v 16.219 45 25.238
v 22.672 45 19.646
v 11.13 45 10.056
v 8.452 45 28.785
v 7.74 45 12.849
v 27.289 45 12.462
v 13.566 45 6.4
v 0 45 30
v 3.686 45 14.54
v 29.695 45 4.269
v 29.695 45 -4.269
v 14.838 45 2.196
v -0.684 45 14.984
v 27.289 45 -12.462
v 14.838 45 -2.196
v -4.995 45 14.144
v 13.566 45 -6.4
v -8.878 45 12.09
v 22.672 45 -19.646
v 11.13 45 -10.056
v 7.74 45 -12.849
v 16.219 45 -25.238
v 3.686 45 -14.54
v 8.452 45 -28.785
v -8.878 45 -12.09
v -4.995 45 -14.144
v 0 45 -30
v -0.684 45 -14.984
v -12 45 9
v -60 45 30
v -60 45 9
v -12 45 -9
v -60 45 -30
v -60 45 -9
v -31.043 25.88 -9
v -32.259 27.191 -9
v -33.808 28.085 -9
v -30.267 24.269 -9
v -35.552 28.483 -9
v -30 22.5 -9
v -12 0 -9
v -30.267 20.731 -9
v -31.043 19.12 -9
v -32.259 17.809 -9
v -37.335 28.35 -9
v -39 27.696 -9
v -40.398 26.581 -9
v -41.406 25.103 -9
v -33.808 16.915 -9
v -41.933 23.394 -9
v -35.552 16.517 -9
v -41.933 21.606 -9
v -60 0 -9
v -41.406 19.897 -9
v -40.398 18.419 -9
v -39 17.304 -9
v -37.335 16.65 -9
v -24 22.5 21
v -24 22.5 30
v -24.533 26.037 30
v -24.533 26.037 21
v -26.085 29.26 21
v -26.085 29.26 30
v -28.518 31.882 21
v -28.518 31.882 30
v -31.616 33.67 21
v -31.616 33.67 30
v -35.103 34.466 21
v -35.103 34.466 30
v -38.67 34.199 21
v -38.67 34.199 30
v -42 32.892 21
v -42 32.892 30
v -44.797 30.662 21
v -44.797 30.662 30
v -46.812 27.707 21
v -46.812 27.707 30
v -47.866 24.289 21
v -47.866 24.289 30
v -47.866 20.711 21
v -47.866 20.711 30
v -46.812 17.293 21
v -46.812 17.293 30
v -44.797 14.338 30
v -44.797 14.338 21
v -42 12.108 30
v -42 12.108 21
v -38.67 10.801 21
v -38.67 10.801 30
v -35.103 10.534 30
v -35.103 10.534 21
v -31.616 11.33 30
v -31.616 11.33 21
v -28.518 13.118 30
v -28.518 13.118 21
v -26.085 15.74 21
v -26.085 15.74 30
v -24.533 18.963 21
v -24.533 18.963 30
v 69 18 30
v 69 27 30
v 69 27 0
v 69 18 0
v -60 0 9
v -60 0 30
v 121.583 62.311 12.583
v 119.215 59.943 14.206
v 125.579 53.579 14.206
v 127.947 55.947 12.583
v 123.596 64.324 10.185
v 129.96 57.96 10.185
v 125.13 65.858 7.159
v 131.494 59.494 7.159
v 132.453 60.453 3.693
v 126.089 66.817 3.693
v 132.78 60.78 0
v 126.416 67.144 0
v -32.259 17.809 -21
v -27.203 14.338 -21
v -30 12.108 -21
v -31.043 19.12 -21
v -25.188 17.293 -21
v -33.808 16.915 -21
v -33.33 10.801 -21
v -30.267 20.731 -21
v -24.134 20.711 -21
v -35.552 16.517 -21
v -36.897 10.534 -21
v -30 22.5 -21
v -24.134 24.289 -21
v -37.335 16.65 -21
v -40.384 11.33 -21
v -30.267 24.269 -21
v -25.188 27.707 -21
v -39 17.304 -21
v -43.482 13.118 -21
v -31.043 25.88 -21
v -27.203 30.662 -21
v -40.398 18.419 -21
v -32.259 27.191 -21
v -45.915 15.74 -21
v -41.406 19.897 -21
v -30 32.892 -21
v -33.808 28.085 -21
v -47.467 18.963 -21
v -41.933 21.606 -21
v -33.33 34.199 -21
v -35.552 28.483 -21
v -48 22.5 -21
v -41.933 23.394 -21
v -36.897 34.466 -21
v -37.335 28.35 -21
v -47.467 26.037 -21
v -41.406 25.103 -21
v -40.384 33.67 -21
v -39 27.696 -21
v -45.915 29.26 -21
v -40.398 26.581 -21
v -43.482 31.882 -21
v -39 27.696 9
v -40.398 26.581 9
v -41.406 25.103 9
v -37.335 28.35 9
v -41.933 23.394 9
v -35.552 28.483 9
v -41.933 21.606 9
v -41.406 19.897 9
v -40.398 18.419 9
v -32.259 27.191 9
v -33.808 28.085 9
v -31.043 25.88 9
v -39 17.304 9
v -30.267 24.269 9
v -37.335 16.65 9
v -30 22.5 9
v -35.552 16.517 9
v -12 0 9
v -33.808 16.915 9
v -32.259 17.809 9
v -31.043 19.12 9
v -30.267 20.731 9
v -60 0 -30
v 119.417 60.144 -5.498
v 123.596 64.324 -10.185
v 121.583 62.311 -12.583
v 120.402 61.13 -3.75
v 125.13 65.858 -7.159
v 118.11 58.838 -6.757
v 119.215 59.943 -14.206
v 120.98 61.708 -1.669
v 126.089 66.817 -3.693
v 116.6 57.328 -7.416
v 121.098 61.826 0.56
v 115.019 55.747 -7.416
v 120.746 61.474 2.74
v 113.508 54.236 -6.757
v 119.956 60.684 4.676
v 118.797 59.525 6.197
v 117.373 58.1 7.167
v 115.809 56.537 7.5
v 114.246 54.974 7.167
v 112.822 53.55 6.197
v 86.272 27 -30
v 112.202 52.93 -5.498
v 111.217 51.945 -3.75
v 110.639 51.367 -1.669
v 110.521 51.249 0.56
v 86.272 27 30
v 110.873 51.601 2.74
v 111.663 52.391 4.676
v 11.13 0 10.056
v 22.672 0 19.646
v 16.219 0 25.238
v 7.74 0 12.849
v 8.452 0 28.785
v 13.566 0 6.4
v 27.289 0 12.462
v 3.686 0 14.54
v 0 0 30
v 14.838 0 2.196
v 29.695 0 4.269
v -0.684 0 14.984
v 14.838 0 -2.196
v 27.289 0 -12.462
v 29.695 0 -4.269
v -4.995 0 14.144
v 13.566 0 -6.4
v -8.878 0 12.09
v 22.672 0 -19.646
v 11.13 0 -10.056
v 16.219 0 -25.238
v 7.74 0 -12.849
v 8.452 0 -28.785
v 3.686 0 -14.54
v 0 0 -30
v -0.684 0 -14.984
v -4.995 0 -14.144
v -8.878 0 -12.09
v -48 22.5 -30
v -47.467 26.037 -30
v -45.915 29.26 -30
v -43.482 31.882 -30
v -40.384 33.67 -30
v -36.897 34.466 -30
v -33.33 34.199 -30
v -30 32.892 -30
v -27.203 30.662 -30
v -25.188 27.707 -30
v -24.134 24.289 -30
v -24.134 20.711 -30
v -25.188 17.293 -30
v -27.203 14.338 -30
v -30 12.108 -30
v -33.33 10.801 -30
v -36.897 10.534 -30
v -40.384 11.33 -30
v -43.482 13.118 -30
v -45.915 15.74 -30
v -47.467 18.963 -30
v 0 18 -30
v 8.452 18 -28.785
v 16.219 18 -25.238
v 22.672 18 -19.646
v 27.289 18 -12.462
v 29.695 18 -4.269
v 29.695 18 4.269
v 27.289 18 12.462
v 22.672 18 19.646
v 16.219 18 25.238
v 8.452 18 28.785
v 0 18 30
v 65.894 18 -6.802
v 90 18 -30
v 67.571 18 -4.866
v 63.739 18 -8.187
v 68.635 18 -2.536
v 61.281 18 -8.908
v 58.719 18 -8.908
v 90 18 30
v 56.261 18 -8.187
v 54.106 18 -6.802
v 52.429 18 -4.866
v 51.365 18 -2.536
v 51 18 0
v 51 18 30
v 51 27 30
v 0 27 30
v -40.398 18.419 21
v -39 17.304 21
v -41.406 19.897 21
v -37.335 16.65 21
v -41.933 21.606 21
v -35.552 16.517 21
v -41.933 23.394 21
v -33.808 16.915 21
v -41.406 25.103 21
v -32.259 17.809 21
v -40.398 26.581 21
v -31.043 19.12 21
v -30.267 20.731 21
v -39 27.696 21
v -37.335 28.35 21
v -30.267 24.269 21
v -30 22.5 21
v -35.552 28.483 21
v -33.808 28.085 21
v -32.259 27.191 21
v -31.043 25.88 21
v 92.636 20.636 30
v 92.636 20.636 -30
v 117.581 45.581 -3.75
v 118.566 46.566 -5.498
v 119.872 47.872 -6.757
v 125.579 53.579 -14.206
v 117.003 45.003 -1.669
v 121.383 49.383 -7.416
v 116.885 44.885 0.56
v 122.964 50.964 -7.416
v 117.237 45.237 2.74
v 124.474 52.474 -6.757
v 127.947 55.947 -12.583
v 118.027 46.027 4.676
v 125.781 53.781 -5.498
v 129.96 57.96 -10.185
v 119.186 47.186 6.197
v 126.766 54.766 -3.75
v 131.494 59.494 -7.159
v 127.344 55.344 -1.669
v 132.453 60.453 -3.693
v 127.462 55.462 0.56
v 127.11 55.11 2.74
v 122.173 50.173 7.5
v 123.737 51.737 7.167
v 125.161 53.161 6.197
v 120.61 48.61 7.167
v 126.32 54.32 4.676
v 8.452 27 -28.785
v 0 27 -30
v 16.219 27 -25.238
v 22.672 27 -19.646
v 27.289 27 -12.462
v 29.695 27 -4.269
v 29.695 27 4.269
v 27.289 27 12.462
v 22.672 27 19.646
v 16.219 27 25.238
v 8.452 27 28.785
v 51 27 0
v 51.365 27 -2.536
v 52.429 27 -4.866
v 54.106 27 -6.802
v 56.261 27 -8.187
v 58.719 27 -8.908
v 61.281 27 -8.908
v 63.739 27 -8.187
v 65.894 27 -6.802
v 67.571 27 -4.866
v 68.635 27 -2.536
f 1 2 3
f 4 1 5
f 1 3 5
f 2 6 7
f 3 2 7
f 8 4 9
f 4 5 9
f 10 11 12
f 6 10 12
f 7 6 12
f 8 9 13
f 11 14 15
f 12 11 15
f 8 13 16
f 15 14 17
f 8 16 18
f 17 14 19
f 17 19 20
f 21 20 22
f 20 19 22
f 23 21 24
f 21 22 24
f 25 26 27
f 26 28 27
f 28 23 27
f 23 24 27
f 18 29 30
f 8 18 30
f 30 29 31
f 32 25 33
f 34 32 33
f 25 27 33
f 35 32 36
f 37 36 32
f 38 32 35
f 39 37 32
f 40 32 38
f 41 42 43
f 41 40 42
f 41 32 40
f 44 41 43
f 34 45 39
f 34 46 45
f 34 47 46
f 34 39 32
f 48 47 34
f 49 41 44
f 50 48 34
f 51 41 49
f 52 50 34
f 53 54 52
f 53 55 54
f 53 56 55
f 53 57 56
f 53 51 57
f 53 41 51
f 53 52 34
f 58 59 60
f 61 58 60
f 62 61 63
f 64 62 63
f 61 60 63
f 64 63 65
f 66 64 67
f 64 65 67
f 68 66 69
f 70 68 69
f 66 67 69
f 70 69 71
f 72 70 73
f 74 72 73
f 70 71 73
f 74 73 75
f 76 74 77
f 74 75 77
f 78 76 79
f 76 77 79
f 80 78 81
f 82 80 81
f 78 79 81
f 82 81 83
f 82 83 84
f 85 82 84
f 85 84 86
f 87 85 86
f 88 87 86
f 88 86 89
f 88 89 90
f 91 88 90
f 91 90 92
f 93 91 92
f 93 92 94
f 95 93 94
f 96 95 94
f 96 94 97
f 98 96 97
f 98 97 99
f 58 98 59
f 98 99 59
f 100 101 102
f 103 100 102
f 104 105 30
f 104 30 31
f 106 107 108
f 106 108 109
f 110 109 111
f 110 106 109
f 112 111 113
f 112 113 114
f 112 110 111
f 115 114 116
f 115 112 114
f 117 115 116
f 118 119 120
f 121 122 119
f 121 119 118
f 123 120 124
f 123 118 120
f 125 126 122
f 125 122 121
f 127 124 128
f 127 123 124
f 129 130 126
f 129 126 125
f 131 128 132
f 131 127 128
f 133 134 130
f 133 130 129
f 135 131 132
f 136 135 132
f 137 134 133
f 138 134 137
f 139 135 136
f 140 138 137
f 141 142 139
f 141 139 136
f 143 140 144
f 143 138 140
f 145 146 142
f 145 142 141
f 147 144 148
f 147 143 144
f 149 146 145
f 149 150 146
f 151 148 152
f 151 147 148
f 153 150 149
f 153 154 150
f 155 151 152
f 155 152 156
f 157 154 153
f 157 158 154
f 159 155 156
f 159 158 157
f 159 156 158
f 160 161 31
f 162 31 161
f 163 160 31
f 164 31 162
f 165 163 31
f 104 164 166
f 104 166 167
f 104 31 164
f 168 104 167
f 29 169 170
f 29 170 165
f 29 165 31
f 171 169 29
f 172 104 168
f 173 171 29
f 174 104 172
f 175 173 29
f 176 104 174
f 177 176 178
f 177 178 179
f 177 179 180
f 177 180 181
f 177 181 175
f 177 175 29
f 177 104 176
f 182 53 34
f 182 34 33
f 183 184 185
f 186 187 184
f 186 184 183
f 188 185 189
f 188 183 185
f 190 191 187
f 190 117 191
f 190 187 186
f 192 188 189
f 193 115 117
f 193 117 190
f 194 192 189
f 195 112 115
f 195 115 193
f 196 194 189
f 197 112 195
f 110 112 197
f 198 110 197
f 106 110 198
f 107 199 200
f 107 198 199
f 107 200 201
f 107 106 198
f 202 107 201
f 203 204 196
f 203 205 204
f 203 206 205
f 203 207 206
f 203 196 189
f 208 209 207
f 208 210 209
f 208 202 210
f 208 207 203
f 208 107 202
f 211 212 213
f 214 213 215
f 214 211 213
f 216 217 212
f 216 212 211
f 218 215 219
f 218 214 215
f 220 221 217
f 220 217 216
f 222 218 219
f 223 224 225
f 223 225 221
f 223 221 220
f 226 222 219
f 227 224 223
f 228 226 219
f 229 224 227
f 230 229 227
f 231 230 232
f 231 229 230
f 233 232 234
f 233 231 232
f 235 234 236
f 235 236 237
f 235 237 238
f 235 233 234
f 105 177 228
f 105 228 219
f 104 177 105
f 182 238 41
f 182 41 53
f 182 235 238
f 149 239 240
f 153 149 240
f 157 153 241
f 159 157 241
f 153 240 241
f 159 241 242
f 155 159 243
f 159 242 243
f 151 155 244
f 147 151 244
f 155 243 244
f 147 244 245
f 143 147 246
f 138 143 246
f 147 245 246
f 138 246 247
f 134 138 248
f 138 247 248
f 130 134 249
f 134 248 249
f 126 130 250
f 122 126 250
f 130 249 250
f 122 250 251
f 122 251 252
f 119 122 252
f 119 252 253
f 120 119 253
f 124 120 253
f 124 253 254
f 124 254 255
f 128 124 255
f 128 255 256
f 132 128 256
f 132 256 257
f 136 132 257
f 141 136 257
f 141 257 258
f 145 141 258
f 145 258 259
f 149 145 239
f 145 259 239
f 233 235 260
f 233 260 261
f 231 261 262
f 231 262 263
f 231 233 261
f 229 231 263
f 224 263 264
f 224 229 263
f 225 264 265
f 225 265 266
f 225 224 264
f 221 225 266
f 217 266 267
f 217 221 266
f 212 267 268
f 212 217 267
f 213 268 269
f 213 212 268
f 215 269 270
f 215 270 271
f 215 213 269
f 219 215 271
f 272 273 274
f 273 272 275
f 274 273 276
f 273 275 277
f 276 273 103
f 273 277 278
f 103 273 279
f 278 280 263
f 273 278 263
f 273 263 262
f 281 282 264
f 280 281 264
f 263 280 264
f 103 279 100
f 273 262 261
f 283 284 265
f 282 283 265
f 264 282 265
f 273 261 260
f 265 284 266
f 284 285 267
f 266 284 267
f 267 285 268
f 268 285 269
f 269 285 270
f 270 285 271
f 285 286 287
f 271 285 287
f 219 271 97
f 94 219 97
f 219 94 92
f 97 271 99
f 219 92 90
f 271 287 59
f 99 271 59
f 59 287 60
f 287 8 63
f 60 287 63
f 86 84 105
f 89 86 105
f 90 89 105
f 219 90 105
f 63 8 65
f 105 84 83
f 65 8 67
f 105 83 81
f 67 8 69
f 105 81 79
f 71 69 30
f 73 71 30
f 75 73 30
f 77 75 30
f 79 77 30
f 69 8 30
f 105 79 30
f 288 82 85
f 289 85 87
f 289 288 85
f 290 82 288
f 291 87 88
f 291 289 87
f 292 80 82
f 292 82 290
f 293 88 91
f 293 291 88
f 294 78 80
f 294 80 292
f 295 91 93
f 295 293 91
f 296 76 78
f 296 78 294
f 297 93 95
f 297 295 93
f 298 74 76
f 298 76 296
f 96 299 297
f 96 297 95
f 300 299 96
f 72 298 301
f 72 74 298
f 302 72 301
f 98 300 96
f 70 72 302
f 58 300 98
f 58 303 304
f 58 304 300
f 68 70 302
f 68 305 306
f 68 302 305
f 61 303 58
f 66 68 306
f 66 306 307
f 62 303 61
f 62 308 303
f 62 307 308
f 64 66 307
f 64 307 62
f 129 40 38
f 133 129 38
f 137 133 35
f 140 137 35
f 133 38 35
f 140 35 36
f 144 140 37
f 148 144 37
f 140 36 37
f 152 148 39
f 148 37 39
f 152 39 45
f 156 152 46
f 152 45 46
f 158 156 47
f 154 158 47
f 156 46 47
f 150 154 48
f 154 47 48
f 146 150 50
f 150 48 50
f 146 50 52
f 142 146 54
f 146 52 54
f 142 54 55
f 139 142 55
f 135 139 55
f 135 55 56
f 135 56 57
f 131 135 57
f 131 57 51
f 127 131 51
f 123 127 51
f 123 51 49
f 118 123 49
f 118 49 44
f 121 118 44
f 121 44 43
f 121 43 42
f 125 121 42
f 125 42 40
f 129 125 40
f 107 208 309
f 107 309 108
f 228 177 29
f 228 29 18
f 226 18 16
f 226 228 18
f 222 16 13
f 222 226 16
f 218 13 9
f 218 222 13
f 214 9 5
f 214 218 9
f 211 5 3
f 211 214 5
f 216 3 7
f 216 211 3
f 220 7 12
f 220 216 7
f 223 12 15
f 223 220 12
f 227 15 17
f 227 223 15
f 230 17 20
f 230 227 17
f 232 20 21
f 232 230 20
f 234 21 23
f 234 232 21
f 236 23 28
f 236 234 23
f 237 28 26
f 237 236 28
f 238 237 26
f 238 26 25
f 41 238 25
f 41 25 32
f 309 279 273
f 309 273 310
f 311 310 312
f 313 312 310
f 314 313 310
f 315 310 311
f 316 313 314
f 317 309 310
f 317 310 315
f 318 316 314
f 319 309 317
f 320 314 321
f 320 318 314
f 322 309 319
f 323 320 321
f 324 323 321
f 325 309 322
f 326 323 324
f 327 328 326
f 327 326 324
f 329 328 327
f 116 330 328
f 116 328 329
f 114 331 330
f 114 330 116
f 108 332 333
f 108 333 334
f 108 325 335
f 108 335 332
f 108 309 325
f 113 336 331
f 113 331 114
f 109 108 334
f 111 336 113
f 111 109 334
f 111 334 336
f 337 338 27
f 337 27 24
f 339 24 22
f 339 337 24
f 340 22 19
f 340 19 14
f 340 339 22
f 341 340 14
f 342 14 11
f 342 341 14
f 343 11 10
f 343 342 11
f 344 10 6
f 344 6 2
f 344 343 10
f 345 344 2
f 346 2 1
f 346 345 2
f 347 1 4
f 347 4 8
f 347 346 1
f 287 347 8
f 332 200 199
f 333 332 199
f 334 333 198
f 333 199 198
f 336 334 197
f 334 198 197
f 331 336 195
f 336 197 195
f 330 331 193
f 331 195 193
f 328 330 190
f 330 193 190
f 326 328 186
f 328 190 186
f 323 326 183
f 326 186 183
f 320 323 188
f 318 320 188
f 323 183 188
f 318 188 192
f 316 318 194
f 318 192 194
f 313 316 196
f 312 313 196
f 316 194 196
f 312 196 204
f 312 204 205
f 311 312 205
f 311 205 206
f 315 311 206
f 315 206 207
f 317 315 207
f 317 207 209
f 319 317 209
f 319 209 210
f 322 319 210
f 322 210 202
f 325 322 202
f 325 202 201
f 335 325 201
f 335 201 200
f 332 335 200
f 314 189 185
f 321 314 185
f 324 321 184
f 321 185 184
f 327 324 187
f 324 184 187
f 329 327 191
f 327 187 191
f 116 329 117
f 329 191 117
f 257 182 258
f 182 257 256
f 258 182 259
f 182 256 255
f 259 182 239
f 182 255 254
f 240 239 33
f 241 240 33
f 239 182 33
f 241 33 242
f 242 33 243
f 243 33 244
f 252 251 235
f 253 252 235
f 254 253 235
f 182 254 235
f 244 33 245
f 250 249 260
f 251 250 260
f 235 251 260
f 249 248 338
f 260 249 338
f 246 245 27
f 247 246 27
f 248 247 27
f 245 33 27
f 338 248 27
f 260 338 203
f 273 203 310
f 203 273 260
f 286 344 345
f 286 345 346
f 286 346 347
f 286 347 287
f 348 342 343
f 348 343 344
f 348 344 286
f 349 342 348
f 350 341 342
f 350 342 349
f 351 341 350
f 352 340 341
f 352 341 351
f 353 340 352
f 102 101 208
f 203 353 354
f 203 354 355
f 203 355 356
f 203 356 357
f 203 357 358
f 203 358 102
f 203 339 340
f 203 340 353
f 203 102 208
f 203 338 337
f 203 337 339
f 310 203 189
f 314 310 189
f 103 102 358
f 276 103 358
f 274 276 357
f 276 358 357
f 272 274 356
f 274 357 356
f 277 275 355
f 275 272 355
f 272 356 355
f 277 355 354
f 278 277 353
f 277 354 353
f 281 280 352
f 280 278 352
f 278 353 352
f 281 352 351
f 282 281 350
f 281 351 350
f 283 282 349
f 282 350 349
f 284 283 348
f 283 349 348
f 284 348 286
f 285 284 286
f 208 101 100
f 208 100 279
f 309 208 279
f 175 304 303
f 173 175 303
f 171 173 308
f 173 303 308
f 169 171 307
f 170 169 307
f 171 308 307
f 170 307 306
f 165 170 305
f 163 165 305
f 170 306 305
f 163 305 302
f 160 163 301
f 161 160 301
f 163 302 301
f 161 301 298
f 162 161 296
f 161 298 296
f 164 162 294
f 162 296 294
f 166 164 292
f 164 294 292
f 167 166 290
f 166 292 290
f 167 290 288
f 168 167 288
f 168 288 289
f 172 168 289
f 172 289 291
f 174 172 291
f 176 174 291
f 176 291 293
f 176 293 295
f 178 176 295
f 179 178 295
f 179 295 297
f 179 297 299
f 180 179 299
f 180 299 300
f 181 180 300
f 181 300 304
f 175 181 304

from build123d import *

# Parameters (mm, degrees)
SALIENTE_EXTRUIR1_DEPTH = 45
CROQUIS3_R              = 6
CORTAR_EXTRUIR1_DEPTH   = 61
CROQUIS3_4_R            = 12
CROQUIS3_4_R_2          = 6
CORTAR_EXTRUIR2_DEPTH   = 9
CROQUIS4_R              = 12
CORTAR_EXTRUIR3_DEPTH   = 9
SALIENTE_EXTRUIR3_DEPTH = 45
CORTAR_EXTRUIR4_DEPTH   = 18
CORTAR_EXTRUIR5_DEPTH   = 18
SALIENTE_EXTRUIR4_DEPTH = 45
CROQUIS8_R              = 6
CORTAR_EXTRUIR7_DEPTH   = 61
CROQUIS9_R              = 12
CORTAR_EXTRUIR8_DEPTH   = 9
CROQUIS10_R             = 12
CORTAR_EXTRUIR9_DEPTH   = 9
SALIENTE_EXTRUIR7_DEPTH = 60
CORTAR_EXTRUIR10_DEPTH  = 52.977922061
CORTAR_EXTRUIR11_DEPTH  = 52.977922061
CROQUIS21_R             = 7.5
CORTAR_EXTRUIR13_DEPTH  = 52.977922061


with BuildPart() as part:
    # Croquis2 → Saliente-Extruir1 (new body)
    with BuildSketch(Plane(origin=(0, 0, 0), x_dir=(1, 0, 0), z_dir=(0, 1, 0))):
        with BuildLine():
            Line((-12, 9), (-60, 9))
            Line((-60, 9), (-60, 30))
            Line((-60, 30), (0, 30))
            ThreePointArc((0, 30), (30, 0), (0, -30))
            Line((0, -30), (-60, -30))
            Line((-60, -30), (-60, -9))
            Line((-60, -9), (-12, -9))
            ThreePointArc((-12, -9), (15, 0), (-12, 9))
        make_face()
    extrude(amount=SALIENTE_EXTRUIR1_DEPTH)

    # Croquis3 → Cortar-Extruir1 (cut, through all)
    with BuildSketch(Plane.XY.offset(30)):
        with Locations((-36, 22.5)):
            Circle(CROQUIS3_R)
    extrude(amount=-CORTAR_EXTRUIR1_DEPTH, mode=Mode.SUBTRACT)

    # Croquis3_4 → Cortar-Extruir2 (cut)
    with BuildSketch(Plane.XY.offset(30)):
        with Locations((-36, 22.5)):
            Circle(CROQUIS3_4_R)
        with Locations((-36, 22.5)):
            Circle(CROQUIS3_4_R_2, mode=Mode.SUBTRACT)
    extrude(amount=-CORTAR_EXTRUIR2_DEPTH, mode=Mode.SUBTRACT)

    # Croquis4 → Cortar-Extruir3 (cut)
    with BuildSketch(Plane(origin=(0, 0, -30), x_dir=(-1, 0, 0), z_dir=(0, 0, -1))):
        with Locations((36, 22.5)):
            Circle(CROQUIS4_R)
    extrude(amount=-CORTAR_EXTRUIR3_DEPTH, mode=Mode.SUBTRACT)

    # Croquis5 → Saliente-Extruir3 (add, through all)
    with BuildSketch(Plane(origin=(0, 45, 0), x_dir=(1, 0, 0), z_dir=(0, 1, 0))):
        with BuildLine():
            Line((51, 0), (51, -30))
            Line((51, -30), (0, -30))
            ThreePointArc((0, -30), (30, 0), (0, 30))
            Line((0, 30), (90, 30))
            Line((90, 30), (90, -30))
            Line((90, -30), (69, -30))
            Line((69, -30), (69, 0))
            ThreePointArc((69, 0), (60, 9), (51, 0))
        make_face()
    extrude(amount=-SALIENTE_EXTRUIR3_DEPTH)

    # Croquis6 → Cortar-Extruir4 (cut)
    with BuildSketch(Plane(origin=(0, 45, 0), x_dir=(1, 0, 0), z_dir=(0, 1, 0))):
        with BuildLine():
            Line((69, -30), (90, -30))
            Line((90, -30), (90, 30))
            Line((90, 30), (0, 30))
            Line((0, 30), (0, 15))
            ThreePointArc((0, 15), (15, 0), (0, -15))
            Line((0, -15), (0, -30))
            Line((0, -30), (51, -30))
            Line((51, -30), (51, 0))
            ThreePointArc((51, 0), (60, 9), (69, 0))
            Line((69, 0), (69, -30))
        make_face()
    extrude(amount=-CORTAR_EXTRUIR4_DEPTH, mode=Mode.SUBTRACT)

    # Croquis7 → Cortar-Extruir5 (cut)
    with BuildSketch(Plane.XZ):
        with BuildLine():
            Line((51, 30), (51, 0))
            ThreePointArc((51, 0), (60, -9), (69, 0))
            Line((69, 0), (69, 30))
            Line((69, 30), (90, 30))
            Line((90, 30), (90, -30))
            Line((90, -30), (0, -30))
            Line((0, -30), (0, -15))
            ThreePointArc((0, -15), (15, 0), (0, 15))
            Line((0, 15), (0, 30))
            Line((0, 30), (51, 30))
        make_face()
    extrude(amount=-CORTAR_EXTRUIR5_DEPTH, mode=Mode.SUBTRACT)

    # Croquis2_3 → Saliente-Extruir4 (add)
    with BuildSketch(Plane(origin=(0, 0, 0), x_dir=(1, 0, 0), z_dir=(0, 1, 0))):
        with BuildLine():
            Line((-12, 9), (-60, 9))
            Line((-60, 9), (-60, 30))
            Line((-60, 30), (0, 30))
            ThreePointArc((0, 30), (30, 0), (0, -30))
            Line((0, -30), (-60, -30))
            Line((-60, -30), (-60, -9))
            Line((-60, -9), (-12, -9))
            ThreePointArc((-12, -9), (15, 0), (-12, 9))
        make_face()
    extrude(amount=SALIENTE_EXTRUIR4_DEPTH)

    # Croquis8 → Cortar-Extruir7 (cut, through all)
    with BuildSketch(Plane.XY.offset(30)):
        with Locations((-36, 22.5)):
            Circle(CROQUIS8_R)
    extrude(amount=-CORTAR_EXTRUIR7_DEPTH, mode=Mode.SUBTRACT)

    # Croquis9 → Cortar-Extruir8 (cut)
    with BuildSketch(Plane.XY.offset(30)):
        with Locations((-36, 22.5)):
            Circle(CROQUIS9_R)
    extrude(amount=-CORTAR_EXTRUIR8_DEPTH, mode=Mode.SUBTRACT)

    # Croquis10 → Cortar-Extruir9 (cut)
    with BuildSketch(Plane(origin=(0, 0, -30), x_dir=(-1, 0, 0), z_dir=(0, 0, -1))):
        with Locations((36, 22.5)):
            Circle(CROQUIS10_R)
    extrude(amount=-CORTAR_EXTRUIR9_DEPTH, mode=Mode.SUBTRACT)

    # Croquis16 → Saliente-Extruir7 (add, through all)
    with BuildSketch(Plane.XY.offset(30)):
        Polygon((90, 18), (132.779960262, 60.779960262), (126.415999231, 67.143921292), (83.636038969, 24.363961031), align=None)
    extrude(amount=-SALIENTE_EXTRUIR7_DEPTH)

    # Croquis18 → Cortar-Extruir10 (cut, through all)
    with BuildSketch(Plane(origin=(29.636038969, -29.636038969, 0), x_dir=(0, 0, 1), z_dir=(-0.707106781, 0.707106781, 0))):
        with BuildLine():
            Line((-30, 136.867532368), (-30, 80.09545443))
            Line((-30, 80.09545443), (-14.205841491, 126.68355433))
            ThreePointArc((-14.205841491, 126.68355433), (-8.739555783, 134.058519396), (0, 136.867532368))
            Line((0, 136.867532368), (-30, 136.867532368))
        make_face()
    extrude(amount=-CORTAR_EXTRUIR10_DEPTH, mode=Mode.SUBTRACT)

    # Croquis19 → Cortar-Extruir11 (cut, through all)
    with BuildSketch(Plane(origin=(29.636038969, -29.636038969, 0), x_dir=(0, 0, 1), z_dir=(-0.707106781, 0.707106781, 0))):
        with BuildLine():
            Line((30, 80.09545443), (14.205841491, 126.68355433))
            ThreePointArc((14.205841491, 126.68355433), (8.739555783, 134.058519396), (0, 136.867532368))
            Line((0, 136.867532368), (30, 136.867532368))
            Line((30, 136.867532368), (30, 80.09545443))
        make_face()
    extrude(amount=-CORTAR_EXTRUIR11_DEPTH, mode=Mode.SUBTRACT)

    # Croquis21 → Cortar-Extruir13 (cut, through all)
    with BuildSketch(Plane(origin=(29.636038969, -29.636038969, 0), x_dir=(0, 0, 1), z_dir=(-0.707106781, 0.707106781, 0))):
        with Locations((0, 121.867532368)):
            Circle(CROQUIS21_R)
    extrude(amount=-CORTAR_EXTRUIR13_DEPTH, mode=Mode.SUBTRACT)


solid = part.part
